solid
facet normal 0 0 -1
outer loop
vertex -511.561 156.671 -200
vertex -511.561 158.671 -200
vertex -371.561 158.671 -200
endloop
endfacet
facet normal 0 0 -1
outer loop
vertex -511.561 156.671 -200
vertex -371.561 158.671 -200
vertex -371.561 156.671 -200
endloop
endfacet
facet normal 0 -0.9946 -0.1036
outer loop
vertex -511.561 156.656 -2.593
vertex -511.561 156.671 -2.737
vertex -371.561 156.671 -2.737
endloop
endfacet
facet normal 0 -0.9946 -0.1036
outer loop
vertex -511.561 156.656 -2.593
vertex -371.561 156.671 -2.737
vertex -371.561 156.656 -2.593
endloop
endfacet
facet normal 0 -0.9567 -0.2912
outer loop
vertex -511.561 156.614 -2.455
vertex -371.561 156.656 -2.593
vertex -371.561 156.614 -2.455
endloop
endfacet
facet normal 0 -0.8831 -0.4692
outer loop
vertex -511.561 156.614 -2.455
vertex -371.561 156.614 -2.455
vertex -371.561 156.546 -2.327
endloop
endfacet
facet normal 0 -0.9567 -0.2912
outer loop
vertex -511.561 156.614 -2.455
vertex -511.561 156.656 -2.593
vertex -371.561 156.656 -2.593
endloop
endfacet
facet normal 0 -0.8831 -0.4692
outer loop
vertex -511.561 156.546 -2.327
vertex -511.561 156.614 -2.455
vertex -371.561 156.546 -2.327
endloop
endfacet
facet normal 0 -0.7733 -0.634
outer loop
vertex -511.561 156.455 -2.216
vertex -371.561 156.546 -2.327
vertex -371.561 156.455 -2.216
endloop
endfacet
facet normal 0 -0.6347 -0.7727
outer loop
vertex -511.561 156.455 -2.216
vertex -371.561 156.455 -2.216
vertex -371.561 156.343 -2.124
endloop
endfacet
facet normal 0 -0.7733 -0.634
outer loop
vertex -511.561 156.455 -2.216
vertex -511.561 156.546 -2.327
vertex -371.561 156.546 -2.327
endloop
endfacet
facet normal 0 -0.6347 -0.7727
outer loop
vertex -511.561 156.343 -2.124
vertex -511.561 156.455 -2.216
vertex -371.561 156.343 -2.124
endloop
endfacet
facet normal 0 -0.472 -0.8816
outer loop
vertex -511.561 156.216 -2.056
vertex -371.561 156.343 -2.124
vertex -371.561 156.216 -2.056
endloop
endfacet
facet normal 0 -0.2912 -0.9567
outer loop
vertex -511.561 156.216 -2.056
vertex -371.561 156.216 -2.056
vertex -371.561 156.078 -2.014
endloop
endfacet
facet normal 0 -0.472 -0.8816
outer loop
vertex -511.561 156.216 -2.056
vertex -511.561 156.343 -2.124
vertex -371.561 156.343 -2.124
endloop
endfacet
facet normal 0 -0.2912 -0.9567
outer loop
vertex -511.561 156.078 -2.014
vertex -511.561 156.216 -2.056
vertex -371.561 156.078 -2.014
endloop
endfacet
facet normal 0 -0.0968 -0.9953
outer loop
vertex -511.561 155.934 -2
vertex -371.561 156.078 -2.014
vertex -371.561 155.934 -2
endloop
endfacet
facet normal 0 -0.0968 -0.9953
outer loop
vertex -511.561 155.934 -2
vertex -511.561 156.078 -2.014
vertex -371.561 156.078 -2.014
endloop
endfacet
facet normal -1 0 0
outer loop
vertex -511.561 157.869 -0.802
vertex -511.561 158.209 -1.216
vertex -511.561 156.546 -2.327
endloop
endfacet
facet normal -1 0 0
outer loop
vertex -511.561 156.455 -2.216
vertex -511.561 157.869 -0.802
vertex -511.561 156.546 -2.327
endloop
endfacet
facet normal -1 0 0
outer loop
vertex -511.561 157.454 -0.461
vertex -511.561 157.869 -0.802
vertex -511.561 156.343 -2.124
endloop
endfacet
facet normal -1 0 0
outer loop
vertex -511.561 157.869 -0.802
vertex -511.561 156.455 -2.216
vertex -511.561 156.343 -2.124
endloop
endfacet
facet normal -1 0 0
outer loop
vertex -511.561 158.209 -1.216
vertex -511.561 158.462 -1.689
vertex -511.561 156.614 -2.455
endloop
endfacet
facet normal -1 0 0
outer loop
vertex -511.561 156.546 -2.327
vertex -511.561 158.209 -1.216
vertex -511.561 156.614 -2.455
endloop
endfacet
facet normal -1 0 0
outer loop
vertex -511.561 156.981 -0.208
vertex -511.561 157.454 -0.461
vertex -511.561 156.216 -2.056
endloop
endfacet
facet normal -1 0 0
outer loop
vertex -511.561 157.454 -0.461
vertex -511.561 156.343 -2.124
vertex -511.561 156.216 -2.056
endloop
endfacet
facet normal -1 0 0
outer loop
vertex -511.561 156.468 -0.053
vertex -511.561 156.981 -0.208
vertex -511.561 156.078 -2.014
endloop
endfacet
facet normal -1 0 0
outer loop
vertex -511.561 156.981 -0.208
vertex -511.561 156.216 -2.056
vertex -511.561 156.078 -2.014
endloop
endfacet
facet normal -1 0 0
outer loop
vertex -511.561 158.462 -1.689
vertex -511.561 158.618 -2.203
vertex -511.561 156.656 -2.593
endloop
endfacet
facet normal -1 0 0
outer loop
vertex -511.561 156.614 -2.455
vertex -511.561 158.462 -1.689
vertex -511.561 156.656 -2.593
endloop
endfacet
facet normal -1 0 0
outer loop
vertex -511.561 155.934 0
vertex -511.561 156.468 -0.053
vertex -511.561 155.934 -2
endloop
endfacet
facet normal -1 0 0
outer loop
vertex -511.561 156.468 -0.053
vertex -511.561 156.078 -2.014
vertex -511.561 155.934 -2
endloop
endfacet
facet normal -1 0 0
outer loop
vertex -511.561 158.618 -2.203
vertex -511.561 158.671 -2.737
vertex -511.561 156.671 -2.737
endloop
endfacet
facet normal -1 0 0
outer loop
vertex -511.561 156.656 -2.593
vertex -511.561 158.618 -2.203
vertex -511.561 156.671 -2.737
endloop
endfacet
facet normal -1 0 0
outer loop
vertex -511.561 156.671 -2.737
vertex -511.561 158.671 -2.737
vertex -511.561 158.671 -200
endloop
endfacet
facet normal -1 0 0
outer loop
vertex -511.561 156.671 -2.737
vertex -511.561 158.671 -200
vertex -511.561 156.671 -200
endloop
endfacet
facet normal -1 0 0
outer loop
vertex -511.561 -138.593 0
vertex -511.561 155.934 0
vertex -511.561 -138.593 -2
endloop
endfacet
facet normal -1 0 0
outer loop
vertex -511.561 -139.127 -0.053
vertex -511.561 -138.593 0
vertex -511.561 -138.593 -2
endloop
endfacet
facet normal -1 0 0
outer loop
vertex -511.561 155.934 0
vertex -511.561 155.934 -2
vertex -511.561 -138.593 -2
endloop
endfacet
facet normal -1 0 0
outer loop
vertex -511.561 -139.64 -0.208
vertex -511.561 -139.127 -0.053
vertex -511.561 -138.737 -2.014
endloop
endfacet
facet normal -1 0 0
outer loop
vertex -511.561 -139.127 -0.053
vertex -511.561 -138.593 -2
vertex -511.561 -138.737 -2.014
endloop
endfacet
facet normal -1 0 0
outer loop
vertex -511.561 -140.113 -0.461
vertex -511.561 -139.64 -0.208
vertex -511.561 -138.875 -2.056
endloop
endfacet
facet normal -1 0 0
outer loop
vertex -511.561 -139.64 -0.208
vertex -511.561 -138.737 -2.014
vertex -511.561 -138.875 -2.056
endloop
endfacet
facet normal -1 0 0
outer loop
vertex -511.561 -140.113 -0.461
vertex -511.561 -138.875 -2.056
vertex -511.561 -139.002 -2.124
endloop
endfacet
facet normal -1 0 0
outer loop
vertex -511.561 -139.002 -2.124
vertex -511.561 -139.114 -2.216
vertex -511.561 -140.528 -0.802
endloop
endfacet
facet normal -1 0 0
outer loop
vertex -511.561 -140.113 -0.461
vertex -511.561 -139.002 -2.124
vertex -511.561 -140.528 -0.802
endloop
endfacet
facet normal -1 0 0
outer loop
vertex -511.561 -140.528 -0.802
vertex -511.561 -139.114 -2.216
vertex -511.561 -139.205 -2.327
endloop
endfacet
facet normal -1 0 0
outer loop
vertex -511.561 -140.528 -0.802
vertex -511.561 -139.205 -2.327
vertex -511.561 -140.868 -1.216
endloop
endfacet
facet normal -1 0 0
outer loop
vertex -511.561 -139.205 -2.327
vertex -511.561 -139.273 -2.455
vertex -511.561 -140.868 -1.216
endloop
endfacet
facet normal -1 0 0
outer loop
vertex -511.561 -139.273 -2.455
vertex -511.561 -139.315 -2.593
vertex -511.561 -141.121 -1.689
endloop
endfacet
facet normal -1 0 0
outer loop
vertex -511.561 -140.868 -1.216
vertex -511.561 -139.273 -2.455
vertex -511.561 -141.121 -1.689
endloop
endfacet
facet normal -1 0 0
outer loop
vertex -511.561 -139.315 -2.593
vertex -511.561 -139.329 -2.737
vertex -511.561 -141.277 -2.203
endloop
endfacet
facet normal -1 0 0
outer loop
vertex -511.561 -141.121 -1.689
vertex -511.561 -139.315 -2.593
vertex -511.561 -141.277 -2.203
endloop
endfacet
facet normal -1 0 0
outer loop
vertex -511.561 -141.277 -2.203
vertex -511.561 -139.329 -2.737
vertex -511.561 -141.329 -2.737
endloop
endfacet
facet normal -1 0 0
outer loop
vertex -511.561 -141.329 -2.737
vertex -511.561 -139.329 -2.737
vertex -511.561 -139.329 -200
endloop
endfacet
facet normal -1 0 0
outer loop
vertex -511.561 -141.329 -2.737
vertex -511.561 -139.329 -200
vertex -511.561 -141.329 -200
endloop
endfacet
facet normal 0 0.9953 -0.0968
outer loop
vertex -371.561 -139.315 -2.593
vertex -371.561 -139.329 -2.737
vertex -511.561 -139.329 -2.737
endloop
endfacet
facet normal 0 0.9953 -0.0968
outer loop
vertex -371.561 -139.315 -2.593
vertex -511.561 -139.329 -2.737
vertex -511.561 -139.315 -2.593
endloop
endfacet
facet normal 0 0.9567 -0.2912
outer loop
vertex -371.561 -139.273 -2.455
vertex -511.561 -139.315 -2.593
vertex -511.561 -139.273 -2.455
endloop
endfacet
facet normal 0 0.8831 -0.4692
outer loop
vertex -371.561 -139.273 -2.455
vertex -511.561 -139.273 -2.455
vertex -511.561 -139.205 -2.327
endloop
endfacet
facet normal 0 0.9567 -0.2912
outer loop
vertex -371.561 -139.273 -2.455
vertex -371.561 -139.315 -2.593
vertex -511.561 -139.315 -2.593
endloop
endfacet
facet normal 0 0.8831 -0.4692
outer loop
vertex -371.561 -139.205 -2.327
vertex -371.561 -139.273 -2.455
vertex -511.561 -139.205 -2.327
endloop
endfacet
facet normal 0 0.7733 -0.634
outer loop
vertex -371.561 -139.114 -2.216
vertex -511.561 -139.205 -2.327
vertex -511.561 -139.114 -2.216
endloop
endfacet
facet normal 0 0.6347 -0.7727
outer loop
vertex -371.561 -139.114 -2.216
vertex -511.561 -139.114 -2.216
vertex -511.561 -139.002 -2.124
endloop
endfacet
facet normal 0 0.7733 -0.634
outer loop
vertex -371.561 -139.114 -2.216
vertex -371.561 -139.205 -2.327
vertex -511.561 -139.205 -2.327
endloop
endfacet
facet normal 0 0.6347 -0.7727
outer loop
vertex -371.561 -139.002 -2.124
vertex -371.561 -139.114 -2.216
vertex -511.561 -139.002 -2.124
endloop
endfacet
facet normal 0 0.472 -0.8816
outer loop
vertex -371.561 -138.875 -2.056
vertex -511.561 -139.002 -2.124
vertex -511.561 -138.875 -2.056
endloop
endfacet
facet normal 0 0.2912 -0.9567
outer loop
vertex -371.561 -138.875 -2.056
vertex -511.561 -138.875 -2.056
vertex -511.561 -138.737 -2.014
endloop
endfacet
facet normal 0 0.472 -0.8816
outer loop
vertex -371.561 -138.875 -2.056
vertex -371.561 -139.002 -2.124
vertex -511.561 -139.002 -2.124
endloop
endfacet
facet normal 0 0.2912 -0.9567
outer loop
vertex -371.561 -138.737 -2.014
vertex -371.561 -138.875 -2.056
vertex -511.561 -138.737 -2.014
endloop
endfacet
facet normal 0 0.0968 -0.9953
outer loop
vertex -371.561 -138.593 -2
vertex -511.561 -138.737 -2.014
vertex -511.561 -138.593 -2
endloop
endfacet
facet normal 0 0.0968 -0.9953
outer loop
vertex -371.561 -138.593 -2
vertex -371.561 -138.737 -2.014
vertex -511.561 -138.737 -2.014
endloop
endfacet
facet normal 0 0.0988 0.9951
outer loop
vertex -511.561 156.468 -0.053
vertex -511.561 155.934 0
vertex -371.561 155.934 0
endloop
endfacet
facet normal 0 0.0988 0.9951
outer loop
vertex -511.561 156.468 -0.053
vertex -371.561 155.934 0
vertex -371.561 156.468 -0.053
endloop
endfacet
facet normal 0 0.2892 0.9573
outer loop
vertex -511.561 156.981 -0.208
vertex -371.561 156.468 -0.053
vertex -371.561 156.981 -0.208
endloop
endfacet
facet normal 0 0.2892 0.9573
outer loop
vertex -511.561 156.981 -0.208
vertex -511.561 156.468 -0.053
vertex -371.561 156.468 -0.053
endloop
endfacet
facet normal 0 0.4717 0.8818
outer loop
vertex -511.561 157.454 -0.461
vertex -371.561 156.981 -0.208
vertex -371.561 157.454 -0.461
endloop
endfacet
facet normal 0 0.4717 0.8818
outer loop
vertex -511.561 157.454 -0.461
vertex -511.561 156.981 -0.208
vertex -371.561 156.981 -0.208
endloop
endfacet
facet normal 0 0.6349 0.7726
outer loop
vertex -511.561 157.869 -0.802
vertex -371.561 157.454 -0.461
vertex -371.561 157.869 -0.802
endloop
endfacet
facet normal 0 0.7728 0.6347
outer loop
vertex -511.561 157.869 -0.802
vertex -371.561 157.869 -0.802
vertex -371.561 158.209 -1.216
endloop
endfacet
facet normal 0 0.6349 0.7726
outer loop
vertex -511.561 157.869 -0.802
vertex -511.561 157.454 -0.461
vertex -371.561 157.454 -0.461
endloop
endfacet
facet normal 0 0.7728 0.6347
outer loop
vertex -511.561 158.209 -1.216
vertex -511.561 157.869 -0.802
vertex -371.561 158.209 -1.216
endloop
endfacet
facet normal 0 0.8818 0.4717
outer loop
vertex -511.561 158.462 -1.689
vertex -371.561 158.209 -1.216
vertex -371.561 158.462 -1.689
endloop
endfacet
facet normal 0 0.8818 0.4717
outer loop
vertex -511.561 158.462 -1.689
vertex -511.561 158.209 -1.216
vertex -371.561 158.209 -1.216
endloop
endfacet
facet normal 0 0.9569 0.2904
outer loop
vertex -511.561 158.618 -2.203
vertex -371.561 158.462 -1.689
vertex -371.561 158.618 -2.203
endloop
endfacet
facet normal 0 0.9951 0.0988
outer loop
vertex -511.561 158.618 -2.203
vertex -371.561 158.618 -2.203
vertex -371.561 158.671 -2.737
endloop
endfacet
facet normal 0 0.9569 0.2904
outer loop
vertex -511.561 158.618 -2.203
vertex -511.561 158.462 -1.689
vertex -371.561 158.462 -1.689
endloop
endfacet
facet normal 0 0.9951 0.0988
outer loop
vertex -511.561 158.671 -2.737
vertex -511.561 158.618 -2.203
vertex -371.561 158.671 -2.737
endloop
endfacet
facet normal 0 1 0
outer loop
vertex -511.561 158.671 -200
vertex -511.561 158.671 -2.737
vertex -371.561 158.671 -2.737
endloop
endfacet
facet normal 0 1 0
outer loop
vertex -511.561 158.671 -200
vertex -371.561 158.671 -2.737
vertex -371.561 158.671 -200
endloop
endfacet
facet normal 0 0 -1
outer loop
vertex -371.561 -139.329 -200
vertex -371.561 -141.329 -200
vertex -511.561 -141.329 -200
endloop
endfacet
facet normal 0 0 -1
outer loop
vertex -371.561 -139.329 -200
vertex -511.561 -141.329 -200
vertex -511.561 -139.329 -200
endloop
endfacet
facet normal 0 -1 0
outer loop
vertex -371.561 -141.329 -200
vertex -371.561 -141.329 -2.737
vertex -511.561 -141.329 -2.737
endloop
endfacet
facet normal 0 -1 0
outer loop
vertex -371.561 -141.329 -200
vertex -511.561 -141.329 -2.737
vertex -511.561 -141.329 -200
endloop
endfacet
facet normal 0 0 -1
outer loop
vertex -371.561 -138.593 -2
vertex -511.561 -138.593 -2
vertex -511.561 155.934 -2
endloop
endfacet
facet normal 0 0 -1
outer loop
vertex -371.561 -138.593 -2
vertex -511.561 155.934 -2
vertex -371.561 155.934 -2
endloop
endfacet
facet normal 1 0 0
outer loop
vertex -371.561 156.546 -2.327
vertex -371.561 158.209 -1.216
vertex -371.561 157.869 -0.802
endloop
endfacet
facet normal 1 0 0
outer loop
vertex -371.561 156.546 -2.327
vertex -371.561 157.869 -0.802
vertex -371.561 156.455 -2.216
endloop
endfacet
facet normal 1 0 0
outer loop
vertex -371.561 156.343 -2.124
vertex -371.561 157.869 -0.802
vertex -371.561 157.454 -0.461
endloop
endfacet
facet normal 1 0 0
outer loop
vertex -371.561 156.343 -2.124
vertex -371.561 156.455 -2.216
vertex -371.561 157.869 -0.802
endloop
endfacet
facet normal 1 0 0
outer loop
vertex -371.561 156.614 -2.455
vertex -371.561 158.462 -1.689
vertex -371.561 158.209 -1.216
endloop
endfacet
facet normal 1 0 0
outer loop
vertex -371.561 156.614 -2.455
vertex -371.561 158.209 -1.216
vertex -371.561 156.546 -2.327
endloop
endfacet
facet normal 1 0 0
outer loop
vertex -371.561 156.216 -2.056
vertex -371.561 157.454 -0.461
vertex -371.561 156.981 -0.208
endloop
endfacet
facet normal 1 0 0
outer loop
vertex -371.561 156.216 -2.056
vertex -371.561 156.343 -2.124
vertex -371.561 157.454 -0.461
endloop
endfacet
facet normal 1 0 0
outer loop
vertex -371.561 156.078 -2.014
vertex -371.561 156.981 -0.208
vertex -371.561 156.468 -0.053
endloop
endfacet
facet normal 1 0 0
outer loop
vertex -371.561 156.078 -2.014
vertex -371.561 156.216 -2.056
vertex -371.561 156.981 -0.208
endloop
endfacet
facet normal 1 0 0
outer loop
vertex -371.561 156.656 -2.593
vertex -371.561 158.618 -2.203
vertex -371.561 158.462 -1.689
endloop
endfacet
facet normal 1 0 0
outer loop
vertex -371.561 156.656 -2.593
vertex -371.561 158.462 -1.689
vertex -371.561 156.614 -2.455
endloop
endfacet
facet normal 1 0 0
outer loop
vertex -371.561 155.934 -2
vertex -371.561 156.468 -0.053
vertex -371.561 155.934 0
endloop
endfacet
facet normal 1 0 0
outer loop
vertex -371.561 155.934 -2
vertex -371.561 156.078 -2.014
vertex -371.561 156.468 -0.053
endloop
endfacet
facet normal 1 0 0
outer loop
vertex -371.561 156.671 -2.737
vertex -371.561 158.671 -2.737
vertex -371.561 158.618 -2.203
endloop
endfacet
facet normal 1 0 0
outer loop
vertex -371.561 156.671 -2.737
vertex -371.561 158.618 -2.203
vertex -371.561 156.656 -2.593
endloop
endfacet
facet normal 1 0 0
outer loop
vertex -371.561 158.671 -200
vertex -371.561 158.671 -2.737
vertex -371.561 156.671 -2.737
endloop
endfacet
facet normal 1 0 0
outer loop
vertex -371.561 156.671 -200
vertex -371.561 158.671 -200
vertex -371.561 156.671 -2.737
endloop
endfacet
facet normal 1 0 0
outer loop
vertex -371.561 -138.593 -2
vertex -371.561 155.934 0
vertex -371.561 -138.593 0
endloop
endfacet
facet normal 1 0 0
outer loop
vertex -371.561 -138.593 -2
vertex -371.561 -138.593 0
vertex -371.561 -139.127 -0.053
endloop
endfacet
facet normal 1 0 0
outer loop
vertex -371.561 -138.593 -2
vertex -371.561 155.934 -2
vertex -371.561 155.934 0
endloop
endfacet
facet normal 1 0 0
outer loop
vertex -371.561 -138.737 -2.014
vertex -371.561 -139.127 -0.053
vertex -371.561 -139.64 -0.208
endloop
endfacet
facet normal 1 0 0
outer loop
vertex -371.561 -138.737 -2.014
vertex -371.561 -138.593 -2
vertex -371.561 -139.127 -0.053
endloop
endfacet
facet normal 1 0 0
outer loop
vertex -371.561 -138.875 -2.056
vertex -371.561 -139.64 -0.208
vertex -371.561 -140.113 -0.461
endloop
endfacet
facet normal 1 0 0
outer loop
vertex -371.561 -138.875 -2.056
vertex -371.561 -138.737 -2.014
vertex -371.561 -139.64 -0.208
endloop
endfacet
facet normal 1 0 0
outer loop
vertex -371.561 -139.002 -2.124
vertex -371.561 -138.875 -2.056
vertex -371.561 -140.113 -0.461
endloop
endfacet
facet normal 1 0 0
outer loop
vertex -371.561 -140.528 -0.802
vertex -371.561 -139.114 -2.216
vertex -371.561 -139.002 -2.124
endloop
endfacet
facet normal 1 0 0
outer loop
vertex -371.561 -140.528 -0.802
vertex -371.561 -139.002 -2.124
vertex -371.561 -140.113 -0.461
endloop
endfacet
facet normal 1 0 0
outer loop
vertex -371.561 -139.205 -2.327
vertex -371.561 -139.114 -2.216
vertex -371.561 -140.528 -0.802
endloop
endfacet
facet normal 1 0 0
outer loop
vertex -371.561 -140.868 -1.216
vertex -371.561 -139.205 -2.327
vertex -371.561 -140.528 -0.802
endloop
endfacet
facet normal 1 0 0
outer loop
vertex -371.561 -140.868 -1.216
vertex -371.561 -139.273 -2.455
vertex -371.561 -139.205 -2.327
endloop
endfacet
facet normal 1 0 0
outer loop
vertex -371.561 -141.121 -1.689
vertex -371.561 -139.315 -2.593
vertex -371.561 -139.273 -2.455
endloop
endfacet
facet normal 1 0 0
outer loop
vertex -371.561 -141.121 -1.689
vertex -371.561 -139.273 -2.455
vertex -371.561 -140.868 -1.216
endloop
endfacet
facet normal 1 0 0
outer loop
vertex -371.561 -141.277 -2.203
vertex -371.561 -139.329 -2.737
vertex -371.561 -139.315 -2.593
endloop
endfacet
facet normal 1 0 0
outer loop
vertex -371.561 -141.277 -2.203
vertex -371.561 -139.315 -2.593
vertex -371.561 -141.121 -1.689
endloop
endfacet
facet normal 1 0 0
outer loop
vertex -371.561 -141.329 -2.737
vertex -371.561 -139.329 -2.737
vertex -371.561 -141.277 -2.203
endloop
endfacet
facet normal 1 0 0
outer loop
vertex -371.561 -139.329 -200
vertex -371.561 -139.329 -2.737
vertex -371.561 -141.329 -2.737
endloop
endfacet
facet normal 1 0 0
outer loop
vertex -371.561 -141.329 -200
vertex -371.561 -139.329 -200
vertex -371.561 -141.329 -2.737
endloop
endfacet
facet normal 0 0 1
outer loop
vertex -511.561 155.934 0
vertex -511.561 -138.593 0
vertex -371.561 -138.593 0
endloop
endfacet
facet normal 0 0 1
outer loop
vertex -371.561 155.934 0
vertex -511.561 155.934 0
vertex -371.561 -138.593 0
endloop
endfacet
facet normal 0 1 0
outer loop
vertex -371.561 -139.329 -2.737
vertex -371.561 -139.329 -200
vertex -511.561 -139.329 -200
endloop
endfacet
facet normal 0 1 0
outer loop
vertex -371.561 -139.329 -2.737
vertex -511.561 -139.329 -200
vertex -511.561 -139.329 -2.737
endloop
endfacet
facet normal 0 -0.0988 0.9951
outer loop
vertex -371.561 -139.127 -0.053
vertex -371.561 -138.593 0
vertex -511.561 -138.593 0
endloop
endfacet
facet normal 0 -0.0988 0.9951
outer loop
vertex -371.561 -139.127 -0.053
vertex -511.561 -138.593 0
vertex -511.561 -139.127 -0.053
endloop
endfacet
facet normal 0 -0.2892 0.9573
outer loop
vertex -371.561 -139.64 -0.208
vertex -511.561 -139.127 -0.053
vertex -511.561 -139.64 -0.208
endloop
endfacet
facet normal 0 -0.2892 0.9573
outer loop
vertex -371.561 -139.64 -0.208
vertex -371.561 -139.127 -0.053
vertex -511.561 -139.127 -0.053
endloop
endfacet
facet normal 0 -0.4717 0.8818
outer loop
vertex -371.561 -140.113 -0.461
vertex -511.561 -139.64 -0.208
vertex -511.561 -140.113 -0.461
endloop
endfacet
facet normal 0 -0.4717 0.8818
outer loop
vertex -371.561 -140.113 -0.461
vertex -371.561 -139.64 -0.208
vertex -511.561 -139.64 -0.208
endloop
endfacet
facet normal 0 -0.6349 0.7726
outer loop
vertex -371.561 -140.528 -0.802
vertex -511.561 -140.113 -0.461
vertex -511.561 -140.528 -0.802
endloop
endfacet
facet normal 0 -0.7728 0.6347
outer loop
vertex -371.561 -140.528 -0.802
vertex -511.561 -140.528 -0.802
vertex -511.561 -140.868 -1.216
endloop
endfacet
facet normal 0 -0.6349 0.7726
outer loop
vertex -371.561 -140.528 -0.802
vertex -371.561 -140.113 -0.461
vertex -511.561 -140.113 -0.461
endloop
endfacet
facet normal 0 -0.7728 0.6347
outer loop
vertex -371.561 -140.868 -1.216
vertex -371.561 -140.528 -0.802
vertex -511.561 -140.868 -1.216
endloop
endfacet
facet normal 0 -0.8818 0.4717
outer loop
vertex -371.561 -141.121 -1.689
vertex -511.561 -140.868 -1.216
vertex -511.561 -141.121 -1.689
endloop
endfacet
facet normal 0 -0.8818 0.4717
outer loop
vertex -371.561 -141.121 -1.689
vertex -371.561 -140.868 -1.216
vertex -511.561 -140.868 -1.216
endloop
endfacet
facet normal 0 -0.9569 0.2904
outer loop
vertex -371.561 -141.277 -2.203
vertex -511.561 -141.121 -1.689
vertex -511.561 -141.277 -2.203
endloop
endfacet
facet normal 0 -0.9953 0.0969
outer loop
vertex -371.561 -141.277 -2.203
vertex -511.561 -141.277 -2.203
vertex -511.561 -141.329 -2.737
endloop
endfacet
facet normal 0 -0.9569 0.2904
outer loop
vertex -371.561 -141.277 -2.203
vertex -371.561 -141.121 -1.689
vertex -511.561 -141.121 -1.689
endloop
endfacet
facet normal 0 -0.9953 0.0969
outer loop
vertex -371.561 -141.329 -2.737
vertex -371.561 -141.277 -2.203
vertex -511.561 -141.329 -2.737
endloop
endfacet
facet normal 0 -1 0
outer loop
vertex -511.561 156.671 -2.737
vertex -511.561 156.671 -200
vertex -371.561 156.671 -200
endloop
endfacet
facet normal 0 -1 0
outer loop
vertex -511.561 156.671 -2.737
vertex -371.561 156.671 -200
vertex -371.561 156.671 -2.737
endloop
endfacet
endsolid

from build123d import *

# Parameters (mm, degrees)
SKETCH1_W                    = 140
SKETCH1_H                    = 300
BASE_FLANGE1_DEPTH           = 2
EDGE_FLANGE1_STRIP_W         = 9.4732
EDGE_FLANGE1_STRIP_H         = 2
EDGE_FLANGE1_STRIP_CUT_DEPTH = 140
EDGE_FLANGE1_DEPTH           = 140
EDGE_FLANGE2_STRIP_W         = 9.4732
EDGE_FLANGE2_STRIP_H         = 2
EDGE_FLANGE2_STRIP_CUT_DEPTH = 140
EDGE_FLANGE2_DEPTH           = 140


# Sheet-metal steps are written as plain solids
with BuildPart() as part:
    # Sketch1 → Base-Flange1 (new body)
    with BuildSketch(Plane.XY):
        with Locations((-441.560693642, 8.670520231)):
            Rectangle(SKETCH1_W, SKETCH1_H)
    extrude(amount=-BASE_FLANGE1_DEPTH)

    # Edge-Flange1 strip (across the edge) → Edge-Flange1 strip cut (cut)
    with BuildSketch(Plane(origin=(-511.560693642, 158.670520231, -2), x_dir=(0, -1, 0), z_dir=(1, 0, 0))):
        with Locations((-2, -1)):
            Rectangle(EDGE_FLANGE1_STRIP_W, EDGE_FLANGE1_STRIP_H)
    extrude(amount=EDGE_FLANGE1_STRIP_CUT_DEPTH, mode=Mode.SUBTRACT)

    # Edge-Flange1 section (across the edge) → Edge-Flange1 (add)
    with BuildSketch(Plane(origin=(-511.560693642, 158.670520231, -2), x_dir=(0, -1, 0), z_dir=(1, 0, 0))):
        with BuildLine():
            Line((0, 0.7366), (0, 198))
            Line((0, 198), (2, 198))
            Line((2, 198), (2, 0.7366))
            ThreePointArc((2, 0.7366), (2.215745145, 0.215745145), (2.7366, 0))
            Line((2.7366, 0), (2.7366, -2))
            ThreePointArc((2.7366, -2), (0.801531583, -1.198468417), (0, 0.7366))
        make_face()
    extrude(amount=EDGE_FLANGE1_DEPTH)

    # Edge-Flange2 strip (across the edge) → Edge-Flange2 strip cut (cut)
    with BuildSketch(Plane(origin=(-371.560693642, -141.329479769, -2), x_dir=(0, 1, 0), z_dir=(-1, 0, 0))):
        with Locations((-2, -1)):
            Rectangle(EDGE_FLANGE2_STRIP_W, EDGE_FLANGE2_STRIP_H)
    extrude(amount=EDGE_FLANGE2_STRIP_CUT_DEPTH, mode=Mode.SUBTRACT)

    # Edge-Flange2 section (across the edge) → Edge-Flange2 (add)
    with BuildSketch(Plane(origin=(-371.560693642, -141.329479769, -2), x_dir=(0, 1, 0), z_dir=(-1, 0, 0))):
        with BuildLine():
            Line((0, 0.7366), (0, 198))
            Line((0, 198), (2, 198))
            Line((2, 198), (2, 0.7366))
            ThreePointArc((2, 0.7366), (2.215745145, 0.215745145), (2.7366, 0))
            Line((2.7366, 0), (2.7366, -2))
            ThreePointArc((2.7366, -2), (0.801531583, -1.198468417), (0, 0.7366))
        make_face()
    extrude(amount=EDGE_FLANGE2_DEPTH)


solid = part.part
